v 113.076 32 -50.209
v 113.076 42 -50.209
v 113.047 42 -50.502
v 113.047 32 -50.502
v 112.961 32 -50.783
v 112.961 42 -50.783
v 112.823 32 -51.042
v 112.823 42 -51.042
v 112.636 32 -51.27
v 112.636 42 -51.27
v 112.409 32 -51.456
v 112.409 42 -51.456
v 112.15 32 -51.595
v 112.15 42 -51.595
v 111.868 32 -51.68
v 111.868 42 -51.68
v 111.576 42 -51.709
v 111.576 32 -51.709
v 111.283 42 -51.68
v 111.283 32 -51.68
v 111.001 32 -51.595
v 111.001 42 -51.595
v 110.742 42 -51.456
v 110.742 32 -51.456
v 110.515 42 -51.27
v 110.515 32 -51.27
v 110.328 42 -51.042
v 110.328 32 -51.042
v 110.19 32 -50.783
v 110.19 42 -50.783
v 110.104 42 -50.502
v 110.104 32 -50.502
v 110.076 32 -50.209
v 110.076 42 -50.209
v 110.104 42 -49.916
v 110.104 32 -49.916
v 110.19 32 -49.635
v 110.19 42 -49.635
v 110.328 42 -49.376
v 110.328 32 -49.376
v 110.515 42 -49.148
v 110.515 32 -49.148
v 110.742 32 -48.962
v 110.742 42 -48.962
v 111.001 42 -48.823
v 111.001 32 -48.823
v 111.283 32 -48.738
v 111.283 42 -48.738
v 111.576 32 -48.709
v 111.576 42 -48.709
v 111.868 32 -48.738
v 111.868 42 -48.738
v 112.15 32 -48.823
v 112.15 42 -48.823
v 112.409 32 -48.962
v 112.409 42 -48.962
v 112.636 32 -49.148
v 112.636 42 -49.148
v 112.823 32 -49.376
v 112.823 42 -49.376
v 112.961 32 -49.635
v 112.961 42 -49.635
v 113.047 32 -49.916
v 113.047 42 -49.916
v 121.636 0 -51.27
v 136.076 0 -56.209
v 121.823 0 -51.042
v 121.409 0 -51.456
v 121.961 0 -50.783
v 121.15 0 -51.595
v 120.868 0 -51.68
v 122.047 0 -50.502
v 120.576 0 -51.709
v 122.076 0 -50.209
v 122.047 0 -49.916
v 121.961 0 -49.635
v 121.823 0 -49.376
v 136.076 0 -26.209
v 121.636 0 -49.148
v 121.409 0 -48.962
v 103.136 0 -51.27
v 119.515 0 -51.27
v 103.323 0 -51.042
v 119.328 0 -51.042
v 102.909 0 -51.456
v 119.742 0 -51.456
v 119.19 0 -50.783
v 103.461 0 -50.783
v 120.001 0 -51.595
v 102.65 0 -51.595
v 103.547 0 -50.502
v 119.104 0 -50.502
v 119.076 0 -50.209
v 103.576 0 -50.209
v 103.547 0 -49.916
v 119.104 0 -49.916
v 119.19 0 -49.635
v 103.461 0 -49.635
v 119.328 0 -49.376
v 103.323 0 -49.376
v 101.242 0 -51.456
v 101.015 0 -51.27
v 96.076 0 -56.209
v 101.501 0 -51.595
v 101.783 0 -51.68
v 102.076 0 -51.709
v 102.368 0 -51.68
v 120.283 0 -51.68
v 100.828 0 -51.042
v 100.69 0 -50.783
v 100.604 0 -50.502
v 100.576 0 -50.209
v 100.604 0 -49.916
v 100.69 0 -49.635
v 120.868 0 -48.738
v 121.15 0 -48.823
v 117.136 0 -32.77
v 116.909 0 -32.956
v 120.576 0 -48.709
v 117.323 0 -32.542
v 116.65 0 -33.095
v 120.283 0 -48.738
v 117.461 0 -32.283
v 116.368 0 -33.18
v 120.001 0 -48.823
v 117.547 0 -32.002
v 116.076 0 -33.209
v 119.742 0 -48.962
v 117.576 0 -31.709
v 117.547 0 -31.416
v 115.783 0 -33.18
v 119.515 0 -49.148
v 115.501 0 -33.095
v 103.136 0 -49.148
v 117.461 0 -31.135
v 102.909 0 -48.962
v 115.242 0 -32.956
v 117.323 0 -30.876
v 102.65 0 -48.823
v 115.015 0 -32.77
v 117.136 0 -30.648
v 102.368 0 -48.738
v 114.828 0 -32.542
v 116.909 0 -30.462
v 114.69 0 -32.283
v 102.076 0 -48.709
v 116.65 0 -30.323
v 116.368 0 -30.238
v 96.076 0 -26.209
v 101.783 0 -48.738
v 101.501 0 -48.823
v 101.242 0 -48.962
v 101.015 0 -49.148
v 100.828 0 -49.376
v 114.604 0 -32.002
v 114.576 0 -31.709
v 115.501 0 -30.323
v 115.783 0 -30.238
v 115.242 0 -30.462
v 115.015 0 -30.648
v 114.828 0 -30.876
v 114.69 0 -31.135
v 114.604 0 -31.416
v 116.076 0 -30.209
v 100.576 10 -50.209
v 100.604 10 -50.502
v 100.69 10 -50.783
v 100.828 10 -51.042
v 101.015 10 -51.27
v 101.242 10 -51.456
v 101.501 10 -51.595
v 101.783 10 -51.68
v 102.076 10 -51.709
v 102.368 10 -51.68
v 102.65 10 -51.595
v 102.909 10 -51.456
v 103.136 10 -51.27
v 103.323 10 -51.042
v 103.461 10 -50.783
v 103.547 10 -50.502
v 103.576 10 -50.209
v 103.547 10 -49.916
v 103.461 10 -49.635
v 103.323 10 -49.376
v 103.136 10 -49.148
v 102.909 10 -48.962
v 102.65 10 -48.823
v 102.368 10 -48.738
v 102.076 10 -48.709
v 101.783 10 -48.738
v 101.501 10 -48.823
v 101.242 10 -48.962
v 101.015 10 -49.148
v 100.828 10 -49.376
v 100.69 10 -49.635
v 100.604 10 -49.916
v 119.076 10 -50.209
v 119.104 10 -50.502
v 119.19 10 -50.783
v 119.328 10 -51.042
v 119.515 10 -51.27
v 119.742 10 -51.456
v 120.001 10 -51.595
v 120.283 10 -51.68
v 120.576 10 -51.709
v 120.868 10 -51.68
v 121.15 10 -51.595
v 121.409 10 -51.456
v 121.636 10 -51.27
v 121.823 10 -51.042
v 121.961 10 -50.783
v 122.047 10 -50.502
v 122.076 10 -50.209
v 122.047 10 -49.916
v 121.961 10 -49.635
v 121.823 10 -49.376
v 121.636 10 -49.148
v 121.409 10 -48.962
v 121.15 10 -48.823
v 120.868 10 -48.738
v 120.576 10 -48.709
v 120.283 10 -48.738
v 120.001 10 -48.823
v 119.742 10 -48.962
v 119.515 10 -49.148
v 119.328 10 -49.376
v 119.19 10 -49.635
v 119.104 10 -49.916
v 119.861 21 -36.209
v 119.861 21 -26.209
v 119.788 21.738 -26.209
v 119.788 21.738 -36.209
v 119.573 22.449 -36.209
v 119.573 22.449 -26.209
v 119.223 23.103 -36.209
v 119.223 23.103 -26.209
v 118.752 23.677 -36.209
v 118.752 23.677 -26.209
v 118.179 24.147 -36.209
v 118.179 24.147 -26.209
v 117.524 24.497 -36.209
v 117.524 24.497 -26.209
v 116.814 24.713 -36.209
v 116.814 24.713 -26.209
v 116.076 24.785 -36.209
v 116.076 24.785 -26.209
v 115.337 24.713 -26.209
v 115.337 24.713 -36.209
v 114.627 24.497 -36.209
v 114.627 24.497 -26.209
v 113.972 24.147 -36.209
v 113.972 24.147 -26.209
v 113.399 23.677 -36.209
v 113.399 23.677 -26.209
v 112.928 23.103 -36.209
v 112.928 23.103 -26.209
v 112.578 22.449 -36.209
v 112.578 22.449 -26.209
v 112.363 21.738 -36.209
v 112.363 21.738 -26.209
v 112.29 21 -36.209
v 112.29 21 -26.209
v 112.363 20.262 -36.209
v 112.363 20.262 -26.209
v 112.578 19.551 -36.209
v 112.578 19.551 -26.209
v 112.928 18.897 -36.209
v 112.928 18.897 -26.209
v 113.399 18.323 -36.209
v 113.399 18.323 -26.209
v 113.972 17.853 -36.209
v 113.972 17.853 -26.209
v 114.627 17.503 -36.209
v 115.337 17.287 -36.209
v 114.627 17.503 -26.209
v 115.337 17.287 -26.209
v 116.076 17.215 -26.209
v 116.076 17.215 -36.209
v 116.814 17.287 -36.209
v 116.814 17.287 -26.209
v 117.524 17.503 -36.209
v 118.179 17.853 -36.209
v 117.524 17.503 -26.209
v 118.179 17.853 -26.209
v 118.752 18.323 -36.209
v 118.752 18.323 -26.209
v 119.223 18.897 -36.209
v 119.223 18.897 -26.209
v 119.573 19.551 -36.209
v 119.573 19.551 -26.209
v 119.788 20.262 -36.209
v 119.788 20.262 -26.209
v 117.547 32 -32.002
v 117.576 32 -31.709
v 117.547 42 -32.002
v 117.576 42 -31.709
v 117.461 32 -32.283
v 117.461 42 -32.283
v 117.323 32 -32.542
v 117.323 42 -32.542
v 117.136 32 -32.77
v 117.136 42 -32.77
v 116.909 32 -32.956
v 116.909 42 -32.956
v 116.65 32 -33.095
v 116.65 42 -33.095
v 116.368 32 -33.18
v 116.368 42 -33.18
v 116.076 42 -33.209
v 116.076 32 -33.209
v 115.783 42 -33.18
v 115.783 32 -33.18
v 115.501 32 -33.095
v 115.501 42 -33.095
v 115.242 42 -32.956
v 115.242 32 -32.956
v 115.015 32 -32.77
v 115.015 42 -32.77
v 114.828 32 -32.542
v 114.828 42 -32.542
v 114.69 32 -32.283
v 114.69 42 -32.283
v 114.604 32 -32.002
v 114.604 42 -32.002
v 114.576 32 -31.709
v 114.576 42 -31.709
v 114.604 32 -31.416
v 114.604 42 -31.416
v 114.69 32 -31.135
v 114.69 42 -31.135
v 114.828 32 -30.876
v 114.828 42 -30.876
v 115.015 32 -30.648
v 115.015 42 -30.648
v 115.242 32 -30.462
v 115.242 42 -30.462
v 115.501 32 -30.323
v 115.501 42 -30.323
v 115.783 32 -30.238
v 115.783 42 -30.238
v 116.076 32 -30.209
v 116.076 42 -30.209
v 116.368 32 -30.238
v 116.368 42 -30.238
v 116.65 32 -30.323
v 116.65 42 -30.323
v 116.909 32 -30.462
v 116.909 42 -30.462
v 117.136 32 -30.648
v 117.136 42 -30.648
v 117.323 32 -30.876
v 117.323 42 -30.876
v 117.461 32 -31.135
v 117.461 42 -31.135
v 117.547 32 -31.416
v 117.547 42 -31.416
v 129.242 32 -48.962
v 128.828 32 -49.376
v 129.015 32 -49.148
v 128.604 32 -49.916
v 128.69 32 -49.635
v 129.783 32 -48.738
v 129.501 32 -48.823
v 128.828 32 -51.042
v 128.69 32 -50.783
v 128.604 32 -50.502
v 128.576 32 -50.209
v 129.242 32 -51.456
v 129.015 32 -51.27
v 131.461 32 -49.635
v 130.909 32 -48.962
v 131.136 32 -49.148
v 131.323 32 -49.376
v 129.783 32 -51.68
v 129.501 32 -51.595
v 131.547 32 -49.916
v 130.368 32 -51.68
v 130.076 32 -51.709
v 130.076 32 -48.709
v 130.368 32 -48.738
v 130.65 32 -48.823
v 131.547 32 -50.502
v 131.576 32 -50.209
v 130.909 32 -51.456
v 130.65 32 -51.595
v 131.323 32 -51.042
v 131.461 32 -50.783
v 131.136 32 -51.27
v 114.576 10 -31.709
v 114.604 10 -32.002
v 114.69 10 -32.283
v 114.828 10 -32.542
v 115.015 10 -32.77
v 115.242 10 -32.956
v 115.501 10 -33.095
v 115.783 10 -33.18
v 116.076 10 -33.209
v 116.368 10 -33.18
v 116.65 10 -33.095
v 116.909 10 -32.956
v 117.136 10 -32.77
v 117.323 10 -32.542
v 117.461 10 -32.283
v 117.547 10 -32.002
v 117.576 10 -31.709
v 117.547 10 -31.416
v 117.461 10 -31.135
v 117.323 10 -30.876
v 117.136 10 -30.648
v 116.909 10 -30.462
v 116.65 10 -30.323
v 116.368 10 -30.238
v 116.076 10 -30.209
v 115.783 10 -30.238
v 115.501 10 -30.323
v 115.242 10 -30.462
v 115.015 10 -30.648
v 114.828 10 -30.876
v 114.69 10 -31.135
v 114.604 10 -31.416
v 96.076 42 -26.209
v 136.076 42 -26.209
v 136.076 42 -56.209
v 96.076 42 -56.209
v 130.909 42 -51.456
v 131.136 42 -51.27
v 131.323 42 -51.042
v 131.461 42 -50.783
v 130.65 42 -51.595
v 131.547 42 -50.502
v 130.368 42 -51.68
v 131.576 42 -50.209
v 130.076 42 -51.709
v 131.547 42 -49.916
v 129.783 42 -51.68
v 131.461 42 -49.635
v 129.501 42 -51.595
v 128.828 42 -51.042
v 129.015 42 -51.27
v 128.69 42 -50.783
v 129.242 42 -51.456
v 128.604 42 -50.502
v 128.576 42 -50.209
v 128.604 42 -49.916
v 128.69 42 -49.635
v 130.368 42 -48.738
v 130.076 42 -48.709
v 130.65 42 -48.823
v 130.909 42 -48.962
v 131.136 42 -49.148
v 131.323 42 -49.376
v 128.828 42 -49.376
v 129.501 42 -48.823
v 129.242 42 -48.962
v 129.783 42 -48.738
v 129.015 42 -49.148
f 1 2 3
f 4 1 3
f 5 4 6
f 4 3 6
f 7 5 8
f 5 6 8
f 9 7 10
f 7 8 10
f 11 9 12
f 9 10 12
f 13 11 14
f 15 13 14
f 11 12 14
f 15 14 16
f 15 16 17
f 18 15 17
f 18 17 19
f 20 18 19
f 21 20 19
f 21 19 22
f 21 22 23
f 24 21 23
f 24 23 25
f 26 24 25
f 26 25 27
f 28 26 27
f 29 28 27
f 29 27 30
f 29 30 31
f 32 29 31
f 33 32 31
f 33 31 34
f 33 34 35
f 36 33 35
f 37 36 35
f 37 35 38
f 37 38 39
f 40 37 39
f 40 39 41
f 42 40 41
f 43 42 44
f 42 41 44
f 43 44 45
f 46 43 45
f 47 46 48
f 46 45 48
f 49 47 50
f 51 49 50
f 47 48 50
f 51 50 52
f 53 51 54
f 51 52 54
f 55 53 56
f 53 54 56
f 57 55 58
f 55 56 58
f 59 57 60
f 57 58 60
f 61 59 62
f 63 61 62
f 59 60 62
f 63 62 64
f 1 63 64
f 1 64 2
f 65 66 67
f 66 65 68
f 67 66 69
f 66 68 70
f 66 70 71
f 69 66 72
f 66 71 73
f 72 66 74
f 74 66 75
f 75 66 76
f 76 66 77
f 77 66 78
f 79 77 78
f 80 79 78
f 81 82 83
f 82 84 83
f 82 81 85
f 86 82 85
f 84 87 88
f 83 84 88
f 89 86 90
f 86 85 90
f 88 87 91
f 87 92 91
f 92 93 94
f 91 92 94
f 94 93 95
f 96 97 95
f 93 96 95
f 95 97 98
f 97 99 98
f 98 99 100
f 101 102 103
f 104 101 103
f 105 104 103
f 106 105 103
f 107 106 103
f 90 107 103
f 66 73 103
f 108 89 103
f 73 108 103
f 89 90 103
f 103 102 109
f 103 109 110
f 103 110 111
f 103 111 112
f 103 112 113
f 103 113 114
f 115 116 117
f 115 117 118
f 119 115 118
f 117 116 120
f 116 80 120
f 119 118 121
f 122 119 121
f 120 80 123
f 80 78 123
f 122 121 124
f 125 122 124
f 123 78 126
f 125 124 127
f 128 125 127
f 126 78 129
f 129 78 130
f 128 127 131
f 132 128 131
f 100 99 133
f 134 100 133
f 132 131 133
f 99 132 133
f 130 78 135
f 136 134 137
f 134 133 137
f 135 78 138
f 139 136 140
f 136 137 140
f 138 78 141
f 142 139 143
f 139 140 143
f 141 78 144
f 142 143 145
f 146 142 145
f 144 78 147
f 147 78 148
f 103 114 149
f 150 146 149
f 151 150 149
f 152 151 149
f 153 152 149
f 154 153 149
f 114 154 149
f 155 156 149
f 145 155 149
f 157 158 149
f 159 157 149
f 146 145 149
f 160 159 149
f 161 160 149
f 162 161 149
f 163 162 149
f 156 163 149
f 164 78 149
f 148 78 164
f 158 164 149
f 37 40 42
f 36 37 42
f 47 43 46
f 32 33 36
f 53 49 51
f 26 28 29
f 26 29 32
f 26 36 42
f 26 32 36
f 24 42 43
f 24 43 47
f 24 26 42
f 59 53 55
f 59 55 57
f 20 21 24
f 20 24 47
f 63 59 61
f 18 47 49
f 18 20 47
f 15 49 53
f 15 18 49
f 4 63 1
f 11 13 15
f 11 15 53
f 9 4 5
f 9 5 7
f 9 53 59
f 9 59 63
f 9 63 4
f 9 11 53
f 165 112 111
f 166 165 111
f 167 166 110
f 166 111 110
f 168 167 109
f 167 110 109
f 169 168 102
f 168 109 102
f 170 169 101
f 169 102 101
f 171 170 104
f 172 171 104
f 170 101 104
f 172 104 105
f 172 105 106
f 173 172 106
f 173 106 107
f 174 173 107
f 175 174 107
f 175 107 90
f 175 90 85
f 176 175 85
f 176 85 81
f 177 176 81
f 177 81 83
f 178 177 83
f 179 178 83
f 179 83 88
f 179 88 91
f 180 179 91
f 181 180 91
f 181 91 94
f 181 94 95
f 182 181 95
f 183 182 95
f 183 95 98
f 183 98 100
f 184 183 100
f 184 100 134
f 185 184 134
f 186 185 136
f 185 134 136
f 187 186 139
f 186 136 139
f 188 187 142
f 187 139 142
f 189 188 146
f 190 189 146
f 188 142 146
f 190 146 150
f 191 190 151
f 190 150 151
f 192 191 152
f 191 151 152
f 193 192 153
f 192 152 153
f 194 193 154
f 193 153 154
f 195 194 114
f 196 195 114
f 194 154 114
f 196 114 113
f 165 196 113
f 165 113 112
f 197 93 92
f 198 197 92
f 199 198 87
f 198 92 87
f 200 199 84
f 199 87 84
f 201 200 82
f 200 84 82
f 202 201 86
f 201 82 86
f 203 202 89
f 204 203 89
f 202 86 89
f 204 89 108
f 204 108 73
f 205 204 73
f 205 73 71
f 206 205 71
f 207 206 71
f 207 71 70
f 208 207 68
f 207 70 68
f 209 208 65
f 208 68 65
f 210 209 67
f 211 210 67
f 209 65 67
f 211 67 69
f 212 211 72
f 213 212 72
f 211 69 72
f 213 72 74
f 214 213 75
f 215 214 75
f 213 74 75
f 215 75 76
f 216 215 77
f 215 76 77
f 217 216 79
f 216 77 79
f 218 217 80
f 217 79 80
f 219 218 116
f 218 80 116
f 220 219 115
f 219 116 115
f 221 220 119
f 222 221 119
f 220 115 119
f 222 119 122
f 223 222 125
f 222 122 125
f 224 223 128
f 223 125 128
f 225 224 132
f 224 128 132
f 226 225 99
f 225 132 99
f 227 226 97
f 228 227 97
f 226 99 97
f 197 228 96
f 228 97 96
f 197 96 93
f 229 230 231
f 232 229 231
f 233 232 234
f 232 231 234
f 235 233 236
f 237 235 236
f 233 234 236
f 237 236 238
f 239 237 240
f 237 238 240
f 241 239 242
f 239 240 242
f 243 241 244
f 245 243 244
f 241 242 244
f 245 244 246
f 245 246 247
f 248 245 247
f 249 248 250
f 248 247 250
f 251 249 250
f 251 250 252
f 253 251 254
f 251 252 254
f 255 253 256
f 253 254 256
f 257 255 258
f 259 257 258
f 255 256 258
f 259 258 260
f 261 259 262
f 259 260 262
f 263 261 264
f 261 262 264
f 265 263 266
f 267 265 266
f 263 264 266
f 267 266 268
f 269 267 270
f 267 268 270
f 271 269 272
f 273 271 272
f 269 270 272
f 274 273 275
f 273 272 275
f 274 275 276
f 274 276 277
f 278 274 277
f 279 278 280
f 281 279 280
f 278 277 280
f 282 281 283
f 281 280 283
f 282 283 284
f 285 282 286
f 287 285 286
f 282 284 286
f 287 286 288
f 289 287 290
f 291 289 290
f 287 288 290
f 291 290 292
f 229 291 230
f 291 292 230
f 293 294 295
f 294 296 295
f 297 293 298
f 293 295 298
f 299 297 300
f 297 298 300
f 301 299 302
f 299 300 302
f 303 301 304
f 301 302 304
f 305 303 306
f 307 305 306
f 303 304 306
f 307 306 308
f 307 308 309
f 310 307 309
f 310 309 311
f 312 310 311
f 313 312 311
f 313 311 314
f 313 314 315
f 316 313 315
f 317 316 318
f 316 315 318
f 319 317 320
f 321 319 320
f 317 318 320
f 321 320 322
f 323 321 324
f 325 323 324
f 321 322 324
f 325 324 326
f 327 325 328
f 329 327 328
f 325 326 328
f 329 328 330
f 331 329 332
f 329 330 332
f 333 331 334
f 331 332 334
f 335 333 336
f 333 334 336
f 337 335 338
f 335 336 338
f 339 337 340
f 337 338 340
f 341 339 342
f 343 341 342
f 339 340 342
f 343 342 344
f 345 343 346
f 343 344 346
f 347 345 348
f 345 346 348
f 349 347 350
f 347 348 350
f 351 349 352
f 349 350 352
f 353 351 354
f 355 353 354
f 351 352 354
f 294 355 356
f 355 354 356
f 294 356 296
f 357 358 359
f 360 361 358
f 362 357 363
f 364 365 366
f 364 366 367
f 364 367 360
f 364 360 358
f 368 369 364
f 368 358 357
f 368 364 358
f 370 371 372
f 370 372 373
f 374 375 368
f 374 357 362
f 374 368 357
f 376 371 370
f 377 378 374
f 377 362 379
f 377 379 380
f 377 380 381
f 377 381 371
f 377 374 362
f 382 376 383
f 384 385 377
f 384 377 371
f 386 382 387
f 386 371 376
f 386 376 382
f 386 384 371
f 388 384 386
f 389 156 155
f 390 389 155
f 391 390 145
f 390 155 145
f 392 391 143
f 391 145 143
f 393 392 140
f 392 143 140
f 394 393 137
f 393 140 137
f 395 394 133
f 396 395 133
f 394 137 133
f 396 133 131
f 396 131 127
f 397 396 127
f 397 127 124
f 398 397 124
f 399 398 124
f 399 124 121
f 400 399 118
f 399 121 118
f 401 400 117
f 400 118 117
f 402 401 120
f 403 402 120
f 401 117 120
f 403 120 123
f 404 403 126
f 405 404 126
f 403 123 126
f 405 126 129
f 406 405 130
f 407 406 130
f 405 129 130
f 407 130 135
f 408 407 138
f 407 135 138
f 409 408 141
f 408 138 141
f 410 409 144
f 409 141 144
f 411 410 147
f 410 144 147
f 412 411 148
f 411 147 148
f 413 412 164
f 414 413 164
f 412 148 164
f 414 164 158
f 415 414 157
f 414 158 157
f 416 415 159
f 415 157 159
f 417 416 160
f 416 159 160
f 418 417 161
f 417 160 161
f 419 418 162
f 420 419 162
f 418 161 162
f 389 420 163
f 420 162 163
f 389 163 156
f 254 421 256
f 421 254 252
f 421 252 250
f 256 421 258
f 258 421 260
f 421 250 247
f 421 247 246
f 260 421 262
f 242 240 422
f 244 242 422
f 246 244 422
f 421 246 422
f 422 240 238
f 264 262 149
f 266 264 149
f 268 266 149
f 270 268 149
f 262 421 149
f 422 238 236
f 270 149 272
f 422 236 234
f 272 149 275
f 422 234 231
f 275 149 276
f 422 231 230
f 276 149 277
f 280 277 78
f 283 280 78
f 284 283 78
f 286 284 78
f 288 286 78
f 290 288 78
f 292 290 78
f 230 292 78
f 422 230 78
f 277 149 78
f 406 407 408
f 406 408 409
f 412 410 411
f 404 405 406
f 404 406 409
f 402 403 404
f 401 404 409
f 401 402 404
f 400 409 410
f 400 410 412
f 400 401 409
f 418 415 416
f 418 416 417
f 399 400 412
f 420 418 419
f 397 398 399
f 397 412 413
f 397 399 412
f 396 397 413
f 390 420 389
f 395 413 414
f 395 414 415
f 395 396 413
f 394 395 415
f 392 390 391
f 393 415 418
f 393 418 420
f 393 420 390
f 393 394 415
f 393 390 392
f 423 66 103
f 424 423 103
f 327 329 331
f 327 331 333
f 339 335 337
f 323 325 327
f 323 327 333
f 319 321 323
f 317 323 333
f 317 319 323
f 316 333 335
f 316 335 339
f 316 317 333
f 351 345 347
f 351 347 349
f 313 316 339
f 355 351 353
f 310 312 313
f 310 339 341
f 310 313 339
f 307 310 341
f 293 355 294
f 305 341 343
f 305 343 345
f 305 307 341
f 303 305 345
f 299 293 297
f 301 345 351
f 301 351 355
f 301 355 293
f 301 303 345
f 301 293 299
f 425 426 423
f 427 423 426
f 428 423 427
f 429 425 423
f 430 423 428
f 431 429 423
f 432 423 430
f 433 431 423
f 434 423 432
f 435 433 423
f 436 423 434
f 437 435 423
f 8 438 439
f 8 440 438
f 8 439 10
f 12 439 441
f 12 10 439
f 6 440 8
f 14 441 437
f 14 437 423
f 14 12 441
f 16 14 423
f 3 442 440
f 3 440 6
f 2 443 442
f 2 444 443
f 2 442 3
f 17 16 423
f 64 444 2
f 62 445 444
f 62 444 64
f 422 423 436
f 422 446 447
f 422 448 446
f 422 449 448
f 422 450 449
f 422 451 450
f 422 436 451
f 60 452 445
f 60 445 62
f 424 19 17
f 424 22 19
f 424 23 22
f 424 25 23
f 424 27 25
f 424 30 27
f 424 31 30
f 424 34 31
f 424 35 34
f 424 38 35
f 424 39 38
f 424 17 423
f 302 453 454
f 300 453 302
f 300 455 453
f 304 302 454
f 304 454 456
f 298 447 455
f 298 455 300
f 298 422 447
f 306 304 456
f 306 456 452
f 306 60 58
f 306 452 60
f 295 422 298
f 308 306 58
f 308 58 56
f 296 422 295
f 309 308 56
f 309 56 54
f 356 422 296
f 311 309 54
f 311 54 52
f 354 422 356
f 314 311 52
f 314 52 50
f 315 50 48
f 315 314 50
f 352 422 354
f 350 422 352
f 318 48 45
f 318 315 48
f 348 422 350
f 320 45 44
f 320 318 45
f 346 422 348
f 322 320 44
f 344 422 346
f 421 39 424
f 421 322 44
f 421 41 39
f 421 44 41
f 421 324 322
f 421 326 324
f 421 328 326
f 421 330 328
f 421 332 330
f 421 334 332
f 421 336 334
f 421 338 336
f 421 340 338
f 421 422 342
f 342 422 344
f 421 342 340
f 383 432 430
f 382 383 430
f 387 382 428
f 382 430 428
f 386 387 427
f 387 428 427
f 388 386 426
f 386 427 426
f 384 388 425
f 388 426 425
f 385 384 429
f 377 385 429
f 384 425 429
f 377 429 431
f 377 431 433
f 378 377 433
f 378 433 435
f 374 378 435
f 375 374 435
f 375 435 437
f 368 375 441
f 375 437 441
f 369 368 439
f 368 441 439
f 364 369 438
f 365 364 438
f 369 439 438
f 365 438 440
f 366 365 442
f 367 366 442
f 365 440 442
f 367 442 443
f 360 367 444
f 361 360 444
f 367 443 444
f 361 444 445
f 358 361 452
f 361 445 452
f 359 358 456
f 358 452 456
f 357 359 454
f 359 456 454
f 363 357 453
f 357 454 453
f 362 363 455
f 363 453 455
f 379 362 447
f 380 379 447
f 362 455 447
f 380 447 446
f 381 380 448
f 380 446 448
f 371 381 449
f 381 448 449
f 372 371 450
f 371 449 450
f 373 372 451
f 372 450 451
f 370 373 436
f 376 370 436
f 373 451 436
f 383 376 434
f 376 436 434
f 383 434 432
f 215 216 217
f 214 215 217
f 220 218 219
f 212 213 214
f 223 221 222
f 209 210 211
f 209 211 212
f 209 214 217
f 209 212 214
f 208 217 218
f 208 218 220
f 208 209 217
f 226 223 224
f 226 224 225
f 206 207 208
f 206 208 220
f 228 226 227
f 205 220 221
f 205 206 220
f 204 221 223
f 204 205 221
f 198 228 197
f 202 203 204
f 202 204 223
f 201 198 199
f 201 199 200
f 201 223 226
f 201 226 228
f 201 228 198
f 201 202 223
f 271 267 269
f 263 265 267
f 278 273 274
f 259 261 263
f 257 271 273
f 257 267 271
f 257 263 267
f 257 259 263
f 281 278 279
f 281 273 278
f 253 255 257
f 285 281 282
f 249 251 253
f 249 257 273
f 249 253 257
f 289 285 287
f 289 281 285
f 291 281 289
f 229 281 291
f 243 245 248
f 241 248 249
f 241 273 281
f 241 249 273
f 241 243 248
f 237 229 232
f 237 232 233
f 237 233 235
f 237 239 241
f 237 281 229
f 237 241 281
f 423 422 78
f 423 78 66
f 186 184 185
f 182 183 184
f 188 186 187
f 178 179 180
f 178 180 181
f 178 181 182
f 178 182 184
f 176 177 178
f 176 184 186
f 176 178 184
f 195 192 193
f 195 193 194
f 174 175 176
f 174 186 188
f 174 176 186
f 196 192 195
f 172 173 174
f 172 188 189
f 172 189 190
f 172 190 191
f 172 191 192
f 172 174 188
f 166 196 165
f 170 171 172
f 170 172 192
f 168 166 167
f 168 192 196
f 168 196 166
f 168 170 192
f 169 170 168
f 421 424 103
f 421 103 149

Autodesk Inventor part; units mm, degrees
ref_plane "YZ Plane" through (0, 0, 0) normal (1, 0, 0) x (0, 1, 0)
ref_plane "XZ Plane" through (0, 0, 0) normal (0, 1, 0) x (-1, 0, 0)
ref_plane "XY Plane" through (0, 0, 0) normal (0, 0, 1) x (1, 0, 0)
sketch "Skizze1" plane through (0, 0, 0) normal (0, 1, 0) x (-1, 0, 0)
  line L0 (-96.0755, -26.209) -> (-136.0755, -26.209)
  line L1 (-136.0755, -26.209) -> (-136.0755, -56.209)
  line L2 (-136.0755, -56.209) -> (-96.0755, -56.209)
  line L3 (-96.0755, -56.209) -> (-96.0755, -26.209)
  point P0 (0, 0)
  dimension "d0" = 40
  dimension "d1" = 30
extrude "Extrusion1" add sketch "Skizze1" along normal blind 42
sketch "Skizze4" plane through (96.0755, 0, -26.209) normal (0, 0, 1) x (1, 0, 0)
  line L0 (0, 0) -> (40, 0) projected
  line L1 (40, 0) -> (40, 42) projected
  line L2 (0, 42) -> (40, 42) projected
  line L3 (0, 0) -> (0, 42) projected
  line L4 (0, 0) -> (40, 0) projected
  line L5 (40, 0) -> (40, 42) projected
  line L6 (0, 42) -> (40, 42) projected
  line L7 (0, 0) -> (0, 42) projected
  circle A0 centre (20, 21) radius 3.7853
  point P0 (-96.0755, 0)
extrude "Extrusion3" cut sketch "Skizze4" against normal blind 10 contours A0
sketch "Skizze3" plane through (0, 42, 0) normal (0, 1, 0) x (1, 0, 0)
  circle A0 centre (130.0755, 50.209) radius 1.5
  circle A1 centre (111.5755, 50.209) radius 1.5
  circle A2 centre (116.0755, 31.709) radius 1.5
  line L0 (136.0755, 56.209) -> (96.0755, 56.209) projected
  line L1 (136.0755, 26.209) -> (136.0755, 56.209) projected
  point P0 (0, 0)
  dimension "d4" = 3
  dimension "d5" = 3
  dimension "d6" = 3
  dimension "d7" = 6
  dimension "d8" = 6
  dimension "d9" = 6
  dimension "d10" = 18.5
  dimension "d11" = 18.5
  dimension "d12" = 20
extrude "Extrusion2" cut sketch "Skizze3" against normal blind 10
pattern_circular "Runde Anordnung1" count 2 over 360 about axis through (116.0755, 21, -26.209) along (0, 0, -1) of "Extrusion2"
properties part number "01_Coolingblock"
